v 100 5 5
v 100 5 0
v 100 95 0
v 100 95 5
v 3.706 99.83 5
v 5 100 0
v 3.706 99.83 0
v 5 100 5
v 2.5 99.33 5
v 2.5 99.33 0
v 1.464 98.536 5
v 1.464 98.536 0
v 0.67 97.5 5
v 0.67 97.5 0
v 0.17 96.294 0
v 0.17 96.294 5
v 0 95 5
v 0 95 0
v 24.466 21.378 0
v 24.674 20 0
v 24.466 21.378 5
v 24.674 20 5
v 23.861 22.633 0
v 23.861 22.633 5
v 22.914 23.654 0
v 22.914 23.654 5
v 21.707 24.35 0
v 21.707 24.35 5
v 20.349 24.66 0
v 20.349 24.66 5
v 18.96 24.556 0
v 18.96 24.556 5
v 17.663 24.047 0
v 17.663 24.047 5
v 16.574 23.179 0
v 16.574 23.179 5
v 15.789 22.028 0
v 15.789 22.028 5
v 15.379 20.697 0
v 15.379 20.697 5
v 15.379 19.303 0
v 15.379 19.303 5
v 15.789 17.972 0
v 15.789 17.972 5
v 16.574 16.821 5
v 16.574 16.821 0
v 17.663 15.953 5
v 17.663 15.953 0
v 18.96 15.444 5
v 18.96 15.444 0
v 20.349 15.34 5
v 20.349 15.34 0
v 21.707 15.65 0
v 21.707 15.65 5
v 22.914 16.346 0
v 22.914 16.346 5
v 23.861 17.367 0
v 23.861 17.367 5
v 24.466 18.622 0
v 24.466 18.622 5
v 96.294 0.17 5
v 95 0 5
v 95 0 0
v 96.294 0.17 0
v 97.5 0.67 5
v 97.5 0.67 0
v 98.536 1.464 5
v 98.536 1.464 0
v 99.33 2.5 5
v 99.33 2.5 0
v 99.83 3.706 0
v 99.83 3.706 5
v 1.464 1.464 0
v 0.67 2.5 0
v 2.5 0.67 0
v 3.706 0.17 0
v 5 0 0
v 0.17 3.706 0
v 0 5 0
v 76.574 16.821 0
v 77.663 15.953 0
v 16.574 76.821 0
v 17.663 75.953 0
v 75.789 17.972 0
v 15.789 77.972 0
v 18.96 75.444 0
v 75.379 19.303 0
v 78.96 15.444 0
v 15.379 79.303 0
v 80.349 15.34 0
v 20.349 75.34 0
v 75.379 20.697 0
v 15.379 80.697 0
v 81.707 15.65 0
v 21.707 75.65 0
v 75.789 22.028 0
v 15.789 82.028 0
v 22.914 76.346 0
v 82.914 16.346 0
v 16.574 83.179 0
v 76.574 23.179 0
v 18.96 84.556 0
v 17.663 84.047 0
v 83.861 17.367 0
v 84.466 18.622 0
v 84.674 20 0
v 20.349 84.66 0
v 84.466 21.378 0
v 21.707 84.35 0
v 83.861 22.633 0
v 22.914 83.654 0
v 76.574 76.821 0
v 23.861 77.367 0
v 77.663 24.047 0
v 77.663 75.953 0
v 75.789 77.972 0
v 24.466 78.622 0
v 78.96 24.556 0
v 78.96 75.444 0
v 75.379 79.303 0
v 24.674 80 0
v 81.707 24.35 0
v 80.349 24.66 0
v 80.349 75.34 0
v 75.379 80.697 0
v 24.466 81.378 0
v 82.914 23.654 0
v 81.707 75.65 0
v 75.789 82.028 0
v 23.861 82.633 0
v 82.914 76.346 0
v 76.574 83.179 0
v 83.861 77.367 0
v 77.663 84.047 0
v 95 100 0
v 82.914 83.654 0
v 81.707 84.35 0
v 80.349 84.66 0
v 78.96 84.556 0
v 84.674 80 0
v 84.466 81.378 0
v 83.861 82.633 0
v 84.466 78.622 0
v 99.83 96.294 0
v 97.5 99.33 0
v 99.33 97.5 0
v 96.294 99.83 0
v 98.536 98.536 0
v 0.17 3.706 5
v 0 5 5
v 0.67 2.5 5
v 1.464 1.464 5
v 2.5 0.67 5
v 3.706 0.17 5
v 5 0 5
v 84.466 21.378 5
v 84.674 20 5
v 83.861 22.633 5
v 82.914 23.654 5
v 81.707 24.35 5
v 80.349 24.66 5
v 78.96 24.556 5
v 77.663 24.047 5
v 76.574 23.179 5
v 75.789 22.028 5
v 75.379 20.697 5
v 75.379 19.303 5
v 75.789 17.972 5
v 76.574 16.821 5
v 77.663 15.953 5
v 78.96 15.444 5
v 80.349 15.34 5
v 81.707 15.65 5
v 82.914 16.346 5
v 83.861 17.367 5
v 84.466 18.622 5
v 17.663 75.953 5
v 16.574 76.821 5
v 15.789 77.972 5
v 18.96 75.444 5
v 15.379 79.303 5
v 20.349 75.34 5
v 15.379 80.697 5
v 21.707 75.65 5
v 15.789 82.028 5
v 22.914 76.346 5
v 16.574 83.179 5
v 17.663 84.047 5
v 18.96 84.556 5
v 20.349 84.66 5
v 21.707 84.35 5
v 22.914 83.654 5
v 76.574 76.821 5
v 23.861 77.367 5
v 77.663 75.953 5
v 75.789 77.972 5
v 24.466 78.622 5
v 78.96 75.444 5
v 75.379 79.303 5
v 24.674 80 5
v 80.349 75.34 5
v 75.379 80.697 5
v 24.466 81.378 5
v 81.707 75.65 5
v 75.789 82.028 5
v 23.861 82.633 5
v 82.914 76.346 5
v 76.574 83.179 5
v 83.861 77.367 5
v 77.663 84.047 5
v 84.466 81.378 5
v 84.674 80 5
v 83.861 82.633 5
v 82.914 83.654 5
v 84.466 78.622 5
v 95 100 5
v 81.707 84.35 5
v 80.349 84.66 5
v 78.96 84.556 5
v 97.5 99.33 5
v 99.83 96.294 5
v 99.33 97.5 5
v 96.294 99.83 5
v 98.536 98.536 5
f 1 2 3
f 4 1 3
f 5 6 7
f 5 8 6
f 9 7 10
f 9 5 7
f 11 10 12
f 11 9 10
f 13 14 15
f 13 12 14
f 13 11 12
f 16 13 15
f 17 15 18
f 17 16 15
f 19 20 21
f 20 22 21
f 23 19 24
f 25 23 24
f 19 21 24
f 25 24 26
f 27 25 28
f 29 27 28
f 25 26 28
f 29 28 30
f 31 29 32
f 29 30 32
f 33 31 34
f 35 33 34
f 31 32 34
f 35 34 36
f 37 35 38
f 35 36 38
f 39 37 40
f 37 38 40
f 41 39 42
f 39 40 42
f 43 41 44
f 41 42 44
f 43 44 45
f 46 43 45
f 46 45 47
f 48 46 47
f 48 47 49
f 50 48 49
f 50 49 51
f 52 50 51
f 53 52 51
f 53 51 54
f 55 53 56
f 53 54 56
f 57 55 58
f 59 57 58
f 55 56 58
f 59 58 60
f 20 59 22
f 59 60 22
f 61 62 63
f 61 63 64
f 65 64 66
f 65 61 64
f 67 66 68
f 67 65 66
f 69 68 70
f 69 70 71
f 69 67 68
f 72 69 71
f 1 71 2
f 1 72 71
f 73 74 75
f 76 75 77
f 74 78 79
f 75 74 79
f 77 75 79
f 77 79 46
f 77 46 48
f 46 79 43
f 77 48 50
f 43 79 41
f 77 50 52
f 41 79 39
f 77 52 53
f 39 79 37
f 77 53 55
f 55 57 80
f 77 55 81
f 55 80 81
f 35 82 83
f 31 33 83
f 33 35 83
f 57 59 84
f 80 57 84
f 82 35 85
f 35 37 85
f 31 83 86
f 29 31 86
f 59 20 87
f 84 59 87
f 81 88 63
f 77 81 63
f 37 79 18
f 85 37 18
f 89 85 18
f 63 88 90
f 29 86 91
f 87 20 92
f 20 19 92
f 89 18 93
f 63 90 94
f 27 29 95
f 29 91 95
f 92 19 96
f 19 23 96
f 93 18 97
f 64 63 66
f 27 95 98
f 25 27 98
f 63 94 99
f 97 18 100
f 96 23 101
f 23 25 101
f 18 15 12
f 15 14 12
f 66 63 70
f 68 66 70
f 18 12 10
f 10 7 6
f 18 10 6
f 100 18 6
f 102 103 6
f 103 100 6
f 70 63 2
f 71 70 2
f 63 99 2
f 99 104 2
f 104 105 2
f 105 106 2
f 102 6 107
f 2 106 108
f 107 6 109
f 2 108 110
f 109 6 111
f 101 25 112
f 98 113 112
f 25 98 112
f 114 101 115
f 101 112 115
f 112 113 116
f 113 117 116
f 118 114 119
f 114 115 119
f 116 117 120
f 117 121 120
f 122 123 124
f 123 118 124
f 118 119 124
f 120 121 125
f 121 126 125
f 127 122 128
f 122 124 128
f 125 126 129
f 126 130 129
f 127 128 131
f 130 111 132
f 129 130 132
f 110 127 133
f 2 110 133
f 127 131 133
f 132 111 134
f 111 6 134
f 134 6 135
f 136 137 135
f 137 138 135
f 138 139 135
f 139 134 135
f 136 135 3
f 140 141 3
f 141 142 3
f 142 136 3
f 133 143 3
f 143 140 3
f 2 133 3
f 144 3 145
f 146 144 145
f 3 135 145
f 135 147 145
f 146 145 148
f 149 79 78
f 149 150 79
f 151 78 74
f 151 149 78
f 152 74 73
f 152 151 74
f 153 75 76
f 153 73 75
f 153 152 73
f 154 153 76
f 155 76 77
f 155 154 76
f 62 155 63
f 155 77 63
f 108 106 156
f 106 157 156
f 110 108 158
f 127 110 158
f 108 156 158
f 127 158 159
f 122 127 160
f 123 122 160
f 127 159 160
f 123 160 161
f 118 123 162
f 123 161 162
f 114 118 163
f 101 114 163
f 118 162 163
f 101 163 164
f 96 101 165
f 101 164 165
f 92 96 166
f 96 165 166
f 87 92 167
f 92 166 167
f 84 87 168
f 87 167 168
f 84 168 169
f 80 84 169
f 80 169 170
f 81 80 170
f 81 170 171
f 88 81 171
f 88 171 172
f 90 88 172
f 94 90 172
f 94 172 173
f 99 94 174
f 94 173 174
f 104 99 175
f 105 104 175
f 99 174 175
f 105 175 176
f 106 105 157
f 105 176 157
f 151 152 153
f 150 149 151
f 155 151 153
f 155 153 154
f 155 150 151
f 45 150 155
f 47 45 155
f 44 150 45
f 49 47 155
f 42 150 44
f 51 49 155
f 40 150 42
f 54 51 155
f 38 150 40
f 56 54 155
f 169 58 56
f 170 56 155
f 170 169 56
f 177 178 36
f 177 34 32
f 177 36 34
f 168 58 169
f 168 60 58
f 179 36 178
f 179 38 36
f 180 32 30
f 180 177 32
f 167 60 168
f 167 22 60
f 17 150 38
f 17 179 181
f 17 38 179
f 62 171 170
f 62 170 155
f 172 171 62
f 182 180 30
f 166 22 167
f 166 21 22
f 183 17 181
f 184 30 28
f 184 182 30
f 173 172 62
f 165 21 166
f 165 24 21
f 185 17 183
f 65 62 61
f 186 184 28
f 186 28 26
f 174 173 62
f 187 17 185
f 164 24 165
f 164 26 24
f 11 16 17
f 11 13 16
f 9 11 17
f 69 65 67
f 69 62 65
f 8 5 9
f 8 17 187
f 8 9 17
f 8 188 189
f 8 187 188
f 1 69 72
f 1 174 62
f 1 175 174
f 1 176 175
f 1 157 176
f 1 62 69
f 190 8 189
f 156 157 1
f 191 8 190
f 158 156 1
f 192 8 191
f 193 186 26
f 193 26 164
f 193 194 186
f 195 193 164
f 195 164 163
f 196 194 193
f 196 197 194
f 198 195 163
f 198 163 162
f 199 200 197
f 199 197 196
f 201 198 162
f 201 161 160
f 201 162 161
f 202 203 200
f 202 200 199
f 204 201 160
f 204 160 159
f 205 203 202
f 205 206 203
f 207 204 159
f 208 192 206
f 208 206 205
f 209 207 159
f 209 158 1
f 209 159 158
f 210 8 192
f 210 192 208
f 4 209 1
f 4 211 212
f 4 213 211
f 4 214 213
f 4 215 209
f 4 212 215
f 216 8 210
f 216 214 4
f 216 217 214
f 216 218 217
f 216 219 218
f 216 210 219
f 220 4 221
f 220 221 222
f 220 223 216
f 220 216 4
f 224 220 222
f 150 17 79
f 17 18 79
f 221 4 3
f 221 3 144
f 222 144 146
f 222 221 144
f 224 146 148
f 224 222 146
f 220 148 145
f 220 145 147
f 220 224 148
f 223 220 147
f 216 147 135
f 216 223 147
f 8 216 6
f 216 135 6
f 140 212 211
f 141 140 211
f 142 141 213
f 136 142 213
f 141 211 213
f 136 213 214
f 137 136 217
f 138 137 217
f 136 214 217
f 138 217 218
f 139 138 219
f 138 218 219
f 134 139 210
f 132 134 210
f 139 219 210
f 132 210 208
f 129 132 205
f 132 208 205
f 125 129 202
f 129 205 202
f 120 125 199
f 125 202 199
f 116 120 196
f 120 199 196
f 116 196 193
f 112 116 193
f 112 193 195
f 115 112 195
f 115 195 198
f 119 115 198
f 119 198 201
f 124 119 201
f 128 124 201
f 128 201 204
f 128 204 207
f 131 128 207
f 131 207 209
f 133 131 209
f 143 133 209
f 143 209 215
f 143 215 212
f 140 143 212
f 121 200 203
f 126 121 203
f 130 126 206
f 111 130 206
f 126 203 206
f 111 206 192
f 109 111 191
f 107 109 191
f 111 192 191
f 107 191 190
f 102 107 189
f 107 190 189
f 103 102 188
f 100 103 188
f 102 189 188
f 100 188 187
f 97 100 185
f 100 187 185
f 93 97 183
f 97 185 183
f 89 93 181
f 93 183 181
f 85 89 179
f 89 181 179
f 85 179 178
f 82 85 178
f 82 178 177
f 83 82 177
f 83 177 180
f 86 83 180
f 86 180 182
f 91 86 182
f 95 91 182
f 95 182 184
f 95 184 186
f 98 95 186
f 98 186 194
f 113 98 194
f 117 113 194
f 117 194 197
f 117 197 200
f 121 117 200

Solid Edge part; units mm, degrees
sketch "Sketch1" plane through (0, 0, 0) normal (0, 0, 1) x (1, 0, 0)
  line L0 (0, 0) -> (100, 0)
  line L1 (100, 0) -> (100, 100)
  line L2 (100, 100) -> (0, 100)
  line L3 (0, 100) -> (0, 0)
  dimension "D1" = 100
  dimension "D2" = 100
extrude "Protrusion1" add sketch "Sketch1" along normal blind 5
sketch "Sketch2" plane through (50, 50, 5) normal (0, 0, 1) x (1, 0, 0)
  circle A0 centre (-30, 30) radius 4.6735
  circle A1 centre (30, 30) radius 4.6735
  circle A2 centre (30, -30) radius 4.6735
  circle A3 centre (-30, -30) radius 4.6735
  dimension "D1" = 20
  dimension "D2" = 20
  dimension "D3" = 20
  dimension "D4" = 20
  dimension "D5" = 60
  dimension "D6" = 20
extrude "Cutout1" cut sketch "Sketch2" against normal through all
fillet "Round_4" radius 5 4 edges at (100, 0, 2.5) (100, 100, 2.5) (0, 0, 2.5) (0, 100, 2.5)
